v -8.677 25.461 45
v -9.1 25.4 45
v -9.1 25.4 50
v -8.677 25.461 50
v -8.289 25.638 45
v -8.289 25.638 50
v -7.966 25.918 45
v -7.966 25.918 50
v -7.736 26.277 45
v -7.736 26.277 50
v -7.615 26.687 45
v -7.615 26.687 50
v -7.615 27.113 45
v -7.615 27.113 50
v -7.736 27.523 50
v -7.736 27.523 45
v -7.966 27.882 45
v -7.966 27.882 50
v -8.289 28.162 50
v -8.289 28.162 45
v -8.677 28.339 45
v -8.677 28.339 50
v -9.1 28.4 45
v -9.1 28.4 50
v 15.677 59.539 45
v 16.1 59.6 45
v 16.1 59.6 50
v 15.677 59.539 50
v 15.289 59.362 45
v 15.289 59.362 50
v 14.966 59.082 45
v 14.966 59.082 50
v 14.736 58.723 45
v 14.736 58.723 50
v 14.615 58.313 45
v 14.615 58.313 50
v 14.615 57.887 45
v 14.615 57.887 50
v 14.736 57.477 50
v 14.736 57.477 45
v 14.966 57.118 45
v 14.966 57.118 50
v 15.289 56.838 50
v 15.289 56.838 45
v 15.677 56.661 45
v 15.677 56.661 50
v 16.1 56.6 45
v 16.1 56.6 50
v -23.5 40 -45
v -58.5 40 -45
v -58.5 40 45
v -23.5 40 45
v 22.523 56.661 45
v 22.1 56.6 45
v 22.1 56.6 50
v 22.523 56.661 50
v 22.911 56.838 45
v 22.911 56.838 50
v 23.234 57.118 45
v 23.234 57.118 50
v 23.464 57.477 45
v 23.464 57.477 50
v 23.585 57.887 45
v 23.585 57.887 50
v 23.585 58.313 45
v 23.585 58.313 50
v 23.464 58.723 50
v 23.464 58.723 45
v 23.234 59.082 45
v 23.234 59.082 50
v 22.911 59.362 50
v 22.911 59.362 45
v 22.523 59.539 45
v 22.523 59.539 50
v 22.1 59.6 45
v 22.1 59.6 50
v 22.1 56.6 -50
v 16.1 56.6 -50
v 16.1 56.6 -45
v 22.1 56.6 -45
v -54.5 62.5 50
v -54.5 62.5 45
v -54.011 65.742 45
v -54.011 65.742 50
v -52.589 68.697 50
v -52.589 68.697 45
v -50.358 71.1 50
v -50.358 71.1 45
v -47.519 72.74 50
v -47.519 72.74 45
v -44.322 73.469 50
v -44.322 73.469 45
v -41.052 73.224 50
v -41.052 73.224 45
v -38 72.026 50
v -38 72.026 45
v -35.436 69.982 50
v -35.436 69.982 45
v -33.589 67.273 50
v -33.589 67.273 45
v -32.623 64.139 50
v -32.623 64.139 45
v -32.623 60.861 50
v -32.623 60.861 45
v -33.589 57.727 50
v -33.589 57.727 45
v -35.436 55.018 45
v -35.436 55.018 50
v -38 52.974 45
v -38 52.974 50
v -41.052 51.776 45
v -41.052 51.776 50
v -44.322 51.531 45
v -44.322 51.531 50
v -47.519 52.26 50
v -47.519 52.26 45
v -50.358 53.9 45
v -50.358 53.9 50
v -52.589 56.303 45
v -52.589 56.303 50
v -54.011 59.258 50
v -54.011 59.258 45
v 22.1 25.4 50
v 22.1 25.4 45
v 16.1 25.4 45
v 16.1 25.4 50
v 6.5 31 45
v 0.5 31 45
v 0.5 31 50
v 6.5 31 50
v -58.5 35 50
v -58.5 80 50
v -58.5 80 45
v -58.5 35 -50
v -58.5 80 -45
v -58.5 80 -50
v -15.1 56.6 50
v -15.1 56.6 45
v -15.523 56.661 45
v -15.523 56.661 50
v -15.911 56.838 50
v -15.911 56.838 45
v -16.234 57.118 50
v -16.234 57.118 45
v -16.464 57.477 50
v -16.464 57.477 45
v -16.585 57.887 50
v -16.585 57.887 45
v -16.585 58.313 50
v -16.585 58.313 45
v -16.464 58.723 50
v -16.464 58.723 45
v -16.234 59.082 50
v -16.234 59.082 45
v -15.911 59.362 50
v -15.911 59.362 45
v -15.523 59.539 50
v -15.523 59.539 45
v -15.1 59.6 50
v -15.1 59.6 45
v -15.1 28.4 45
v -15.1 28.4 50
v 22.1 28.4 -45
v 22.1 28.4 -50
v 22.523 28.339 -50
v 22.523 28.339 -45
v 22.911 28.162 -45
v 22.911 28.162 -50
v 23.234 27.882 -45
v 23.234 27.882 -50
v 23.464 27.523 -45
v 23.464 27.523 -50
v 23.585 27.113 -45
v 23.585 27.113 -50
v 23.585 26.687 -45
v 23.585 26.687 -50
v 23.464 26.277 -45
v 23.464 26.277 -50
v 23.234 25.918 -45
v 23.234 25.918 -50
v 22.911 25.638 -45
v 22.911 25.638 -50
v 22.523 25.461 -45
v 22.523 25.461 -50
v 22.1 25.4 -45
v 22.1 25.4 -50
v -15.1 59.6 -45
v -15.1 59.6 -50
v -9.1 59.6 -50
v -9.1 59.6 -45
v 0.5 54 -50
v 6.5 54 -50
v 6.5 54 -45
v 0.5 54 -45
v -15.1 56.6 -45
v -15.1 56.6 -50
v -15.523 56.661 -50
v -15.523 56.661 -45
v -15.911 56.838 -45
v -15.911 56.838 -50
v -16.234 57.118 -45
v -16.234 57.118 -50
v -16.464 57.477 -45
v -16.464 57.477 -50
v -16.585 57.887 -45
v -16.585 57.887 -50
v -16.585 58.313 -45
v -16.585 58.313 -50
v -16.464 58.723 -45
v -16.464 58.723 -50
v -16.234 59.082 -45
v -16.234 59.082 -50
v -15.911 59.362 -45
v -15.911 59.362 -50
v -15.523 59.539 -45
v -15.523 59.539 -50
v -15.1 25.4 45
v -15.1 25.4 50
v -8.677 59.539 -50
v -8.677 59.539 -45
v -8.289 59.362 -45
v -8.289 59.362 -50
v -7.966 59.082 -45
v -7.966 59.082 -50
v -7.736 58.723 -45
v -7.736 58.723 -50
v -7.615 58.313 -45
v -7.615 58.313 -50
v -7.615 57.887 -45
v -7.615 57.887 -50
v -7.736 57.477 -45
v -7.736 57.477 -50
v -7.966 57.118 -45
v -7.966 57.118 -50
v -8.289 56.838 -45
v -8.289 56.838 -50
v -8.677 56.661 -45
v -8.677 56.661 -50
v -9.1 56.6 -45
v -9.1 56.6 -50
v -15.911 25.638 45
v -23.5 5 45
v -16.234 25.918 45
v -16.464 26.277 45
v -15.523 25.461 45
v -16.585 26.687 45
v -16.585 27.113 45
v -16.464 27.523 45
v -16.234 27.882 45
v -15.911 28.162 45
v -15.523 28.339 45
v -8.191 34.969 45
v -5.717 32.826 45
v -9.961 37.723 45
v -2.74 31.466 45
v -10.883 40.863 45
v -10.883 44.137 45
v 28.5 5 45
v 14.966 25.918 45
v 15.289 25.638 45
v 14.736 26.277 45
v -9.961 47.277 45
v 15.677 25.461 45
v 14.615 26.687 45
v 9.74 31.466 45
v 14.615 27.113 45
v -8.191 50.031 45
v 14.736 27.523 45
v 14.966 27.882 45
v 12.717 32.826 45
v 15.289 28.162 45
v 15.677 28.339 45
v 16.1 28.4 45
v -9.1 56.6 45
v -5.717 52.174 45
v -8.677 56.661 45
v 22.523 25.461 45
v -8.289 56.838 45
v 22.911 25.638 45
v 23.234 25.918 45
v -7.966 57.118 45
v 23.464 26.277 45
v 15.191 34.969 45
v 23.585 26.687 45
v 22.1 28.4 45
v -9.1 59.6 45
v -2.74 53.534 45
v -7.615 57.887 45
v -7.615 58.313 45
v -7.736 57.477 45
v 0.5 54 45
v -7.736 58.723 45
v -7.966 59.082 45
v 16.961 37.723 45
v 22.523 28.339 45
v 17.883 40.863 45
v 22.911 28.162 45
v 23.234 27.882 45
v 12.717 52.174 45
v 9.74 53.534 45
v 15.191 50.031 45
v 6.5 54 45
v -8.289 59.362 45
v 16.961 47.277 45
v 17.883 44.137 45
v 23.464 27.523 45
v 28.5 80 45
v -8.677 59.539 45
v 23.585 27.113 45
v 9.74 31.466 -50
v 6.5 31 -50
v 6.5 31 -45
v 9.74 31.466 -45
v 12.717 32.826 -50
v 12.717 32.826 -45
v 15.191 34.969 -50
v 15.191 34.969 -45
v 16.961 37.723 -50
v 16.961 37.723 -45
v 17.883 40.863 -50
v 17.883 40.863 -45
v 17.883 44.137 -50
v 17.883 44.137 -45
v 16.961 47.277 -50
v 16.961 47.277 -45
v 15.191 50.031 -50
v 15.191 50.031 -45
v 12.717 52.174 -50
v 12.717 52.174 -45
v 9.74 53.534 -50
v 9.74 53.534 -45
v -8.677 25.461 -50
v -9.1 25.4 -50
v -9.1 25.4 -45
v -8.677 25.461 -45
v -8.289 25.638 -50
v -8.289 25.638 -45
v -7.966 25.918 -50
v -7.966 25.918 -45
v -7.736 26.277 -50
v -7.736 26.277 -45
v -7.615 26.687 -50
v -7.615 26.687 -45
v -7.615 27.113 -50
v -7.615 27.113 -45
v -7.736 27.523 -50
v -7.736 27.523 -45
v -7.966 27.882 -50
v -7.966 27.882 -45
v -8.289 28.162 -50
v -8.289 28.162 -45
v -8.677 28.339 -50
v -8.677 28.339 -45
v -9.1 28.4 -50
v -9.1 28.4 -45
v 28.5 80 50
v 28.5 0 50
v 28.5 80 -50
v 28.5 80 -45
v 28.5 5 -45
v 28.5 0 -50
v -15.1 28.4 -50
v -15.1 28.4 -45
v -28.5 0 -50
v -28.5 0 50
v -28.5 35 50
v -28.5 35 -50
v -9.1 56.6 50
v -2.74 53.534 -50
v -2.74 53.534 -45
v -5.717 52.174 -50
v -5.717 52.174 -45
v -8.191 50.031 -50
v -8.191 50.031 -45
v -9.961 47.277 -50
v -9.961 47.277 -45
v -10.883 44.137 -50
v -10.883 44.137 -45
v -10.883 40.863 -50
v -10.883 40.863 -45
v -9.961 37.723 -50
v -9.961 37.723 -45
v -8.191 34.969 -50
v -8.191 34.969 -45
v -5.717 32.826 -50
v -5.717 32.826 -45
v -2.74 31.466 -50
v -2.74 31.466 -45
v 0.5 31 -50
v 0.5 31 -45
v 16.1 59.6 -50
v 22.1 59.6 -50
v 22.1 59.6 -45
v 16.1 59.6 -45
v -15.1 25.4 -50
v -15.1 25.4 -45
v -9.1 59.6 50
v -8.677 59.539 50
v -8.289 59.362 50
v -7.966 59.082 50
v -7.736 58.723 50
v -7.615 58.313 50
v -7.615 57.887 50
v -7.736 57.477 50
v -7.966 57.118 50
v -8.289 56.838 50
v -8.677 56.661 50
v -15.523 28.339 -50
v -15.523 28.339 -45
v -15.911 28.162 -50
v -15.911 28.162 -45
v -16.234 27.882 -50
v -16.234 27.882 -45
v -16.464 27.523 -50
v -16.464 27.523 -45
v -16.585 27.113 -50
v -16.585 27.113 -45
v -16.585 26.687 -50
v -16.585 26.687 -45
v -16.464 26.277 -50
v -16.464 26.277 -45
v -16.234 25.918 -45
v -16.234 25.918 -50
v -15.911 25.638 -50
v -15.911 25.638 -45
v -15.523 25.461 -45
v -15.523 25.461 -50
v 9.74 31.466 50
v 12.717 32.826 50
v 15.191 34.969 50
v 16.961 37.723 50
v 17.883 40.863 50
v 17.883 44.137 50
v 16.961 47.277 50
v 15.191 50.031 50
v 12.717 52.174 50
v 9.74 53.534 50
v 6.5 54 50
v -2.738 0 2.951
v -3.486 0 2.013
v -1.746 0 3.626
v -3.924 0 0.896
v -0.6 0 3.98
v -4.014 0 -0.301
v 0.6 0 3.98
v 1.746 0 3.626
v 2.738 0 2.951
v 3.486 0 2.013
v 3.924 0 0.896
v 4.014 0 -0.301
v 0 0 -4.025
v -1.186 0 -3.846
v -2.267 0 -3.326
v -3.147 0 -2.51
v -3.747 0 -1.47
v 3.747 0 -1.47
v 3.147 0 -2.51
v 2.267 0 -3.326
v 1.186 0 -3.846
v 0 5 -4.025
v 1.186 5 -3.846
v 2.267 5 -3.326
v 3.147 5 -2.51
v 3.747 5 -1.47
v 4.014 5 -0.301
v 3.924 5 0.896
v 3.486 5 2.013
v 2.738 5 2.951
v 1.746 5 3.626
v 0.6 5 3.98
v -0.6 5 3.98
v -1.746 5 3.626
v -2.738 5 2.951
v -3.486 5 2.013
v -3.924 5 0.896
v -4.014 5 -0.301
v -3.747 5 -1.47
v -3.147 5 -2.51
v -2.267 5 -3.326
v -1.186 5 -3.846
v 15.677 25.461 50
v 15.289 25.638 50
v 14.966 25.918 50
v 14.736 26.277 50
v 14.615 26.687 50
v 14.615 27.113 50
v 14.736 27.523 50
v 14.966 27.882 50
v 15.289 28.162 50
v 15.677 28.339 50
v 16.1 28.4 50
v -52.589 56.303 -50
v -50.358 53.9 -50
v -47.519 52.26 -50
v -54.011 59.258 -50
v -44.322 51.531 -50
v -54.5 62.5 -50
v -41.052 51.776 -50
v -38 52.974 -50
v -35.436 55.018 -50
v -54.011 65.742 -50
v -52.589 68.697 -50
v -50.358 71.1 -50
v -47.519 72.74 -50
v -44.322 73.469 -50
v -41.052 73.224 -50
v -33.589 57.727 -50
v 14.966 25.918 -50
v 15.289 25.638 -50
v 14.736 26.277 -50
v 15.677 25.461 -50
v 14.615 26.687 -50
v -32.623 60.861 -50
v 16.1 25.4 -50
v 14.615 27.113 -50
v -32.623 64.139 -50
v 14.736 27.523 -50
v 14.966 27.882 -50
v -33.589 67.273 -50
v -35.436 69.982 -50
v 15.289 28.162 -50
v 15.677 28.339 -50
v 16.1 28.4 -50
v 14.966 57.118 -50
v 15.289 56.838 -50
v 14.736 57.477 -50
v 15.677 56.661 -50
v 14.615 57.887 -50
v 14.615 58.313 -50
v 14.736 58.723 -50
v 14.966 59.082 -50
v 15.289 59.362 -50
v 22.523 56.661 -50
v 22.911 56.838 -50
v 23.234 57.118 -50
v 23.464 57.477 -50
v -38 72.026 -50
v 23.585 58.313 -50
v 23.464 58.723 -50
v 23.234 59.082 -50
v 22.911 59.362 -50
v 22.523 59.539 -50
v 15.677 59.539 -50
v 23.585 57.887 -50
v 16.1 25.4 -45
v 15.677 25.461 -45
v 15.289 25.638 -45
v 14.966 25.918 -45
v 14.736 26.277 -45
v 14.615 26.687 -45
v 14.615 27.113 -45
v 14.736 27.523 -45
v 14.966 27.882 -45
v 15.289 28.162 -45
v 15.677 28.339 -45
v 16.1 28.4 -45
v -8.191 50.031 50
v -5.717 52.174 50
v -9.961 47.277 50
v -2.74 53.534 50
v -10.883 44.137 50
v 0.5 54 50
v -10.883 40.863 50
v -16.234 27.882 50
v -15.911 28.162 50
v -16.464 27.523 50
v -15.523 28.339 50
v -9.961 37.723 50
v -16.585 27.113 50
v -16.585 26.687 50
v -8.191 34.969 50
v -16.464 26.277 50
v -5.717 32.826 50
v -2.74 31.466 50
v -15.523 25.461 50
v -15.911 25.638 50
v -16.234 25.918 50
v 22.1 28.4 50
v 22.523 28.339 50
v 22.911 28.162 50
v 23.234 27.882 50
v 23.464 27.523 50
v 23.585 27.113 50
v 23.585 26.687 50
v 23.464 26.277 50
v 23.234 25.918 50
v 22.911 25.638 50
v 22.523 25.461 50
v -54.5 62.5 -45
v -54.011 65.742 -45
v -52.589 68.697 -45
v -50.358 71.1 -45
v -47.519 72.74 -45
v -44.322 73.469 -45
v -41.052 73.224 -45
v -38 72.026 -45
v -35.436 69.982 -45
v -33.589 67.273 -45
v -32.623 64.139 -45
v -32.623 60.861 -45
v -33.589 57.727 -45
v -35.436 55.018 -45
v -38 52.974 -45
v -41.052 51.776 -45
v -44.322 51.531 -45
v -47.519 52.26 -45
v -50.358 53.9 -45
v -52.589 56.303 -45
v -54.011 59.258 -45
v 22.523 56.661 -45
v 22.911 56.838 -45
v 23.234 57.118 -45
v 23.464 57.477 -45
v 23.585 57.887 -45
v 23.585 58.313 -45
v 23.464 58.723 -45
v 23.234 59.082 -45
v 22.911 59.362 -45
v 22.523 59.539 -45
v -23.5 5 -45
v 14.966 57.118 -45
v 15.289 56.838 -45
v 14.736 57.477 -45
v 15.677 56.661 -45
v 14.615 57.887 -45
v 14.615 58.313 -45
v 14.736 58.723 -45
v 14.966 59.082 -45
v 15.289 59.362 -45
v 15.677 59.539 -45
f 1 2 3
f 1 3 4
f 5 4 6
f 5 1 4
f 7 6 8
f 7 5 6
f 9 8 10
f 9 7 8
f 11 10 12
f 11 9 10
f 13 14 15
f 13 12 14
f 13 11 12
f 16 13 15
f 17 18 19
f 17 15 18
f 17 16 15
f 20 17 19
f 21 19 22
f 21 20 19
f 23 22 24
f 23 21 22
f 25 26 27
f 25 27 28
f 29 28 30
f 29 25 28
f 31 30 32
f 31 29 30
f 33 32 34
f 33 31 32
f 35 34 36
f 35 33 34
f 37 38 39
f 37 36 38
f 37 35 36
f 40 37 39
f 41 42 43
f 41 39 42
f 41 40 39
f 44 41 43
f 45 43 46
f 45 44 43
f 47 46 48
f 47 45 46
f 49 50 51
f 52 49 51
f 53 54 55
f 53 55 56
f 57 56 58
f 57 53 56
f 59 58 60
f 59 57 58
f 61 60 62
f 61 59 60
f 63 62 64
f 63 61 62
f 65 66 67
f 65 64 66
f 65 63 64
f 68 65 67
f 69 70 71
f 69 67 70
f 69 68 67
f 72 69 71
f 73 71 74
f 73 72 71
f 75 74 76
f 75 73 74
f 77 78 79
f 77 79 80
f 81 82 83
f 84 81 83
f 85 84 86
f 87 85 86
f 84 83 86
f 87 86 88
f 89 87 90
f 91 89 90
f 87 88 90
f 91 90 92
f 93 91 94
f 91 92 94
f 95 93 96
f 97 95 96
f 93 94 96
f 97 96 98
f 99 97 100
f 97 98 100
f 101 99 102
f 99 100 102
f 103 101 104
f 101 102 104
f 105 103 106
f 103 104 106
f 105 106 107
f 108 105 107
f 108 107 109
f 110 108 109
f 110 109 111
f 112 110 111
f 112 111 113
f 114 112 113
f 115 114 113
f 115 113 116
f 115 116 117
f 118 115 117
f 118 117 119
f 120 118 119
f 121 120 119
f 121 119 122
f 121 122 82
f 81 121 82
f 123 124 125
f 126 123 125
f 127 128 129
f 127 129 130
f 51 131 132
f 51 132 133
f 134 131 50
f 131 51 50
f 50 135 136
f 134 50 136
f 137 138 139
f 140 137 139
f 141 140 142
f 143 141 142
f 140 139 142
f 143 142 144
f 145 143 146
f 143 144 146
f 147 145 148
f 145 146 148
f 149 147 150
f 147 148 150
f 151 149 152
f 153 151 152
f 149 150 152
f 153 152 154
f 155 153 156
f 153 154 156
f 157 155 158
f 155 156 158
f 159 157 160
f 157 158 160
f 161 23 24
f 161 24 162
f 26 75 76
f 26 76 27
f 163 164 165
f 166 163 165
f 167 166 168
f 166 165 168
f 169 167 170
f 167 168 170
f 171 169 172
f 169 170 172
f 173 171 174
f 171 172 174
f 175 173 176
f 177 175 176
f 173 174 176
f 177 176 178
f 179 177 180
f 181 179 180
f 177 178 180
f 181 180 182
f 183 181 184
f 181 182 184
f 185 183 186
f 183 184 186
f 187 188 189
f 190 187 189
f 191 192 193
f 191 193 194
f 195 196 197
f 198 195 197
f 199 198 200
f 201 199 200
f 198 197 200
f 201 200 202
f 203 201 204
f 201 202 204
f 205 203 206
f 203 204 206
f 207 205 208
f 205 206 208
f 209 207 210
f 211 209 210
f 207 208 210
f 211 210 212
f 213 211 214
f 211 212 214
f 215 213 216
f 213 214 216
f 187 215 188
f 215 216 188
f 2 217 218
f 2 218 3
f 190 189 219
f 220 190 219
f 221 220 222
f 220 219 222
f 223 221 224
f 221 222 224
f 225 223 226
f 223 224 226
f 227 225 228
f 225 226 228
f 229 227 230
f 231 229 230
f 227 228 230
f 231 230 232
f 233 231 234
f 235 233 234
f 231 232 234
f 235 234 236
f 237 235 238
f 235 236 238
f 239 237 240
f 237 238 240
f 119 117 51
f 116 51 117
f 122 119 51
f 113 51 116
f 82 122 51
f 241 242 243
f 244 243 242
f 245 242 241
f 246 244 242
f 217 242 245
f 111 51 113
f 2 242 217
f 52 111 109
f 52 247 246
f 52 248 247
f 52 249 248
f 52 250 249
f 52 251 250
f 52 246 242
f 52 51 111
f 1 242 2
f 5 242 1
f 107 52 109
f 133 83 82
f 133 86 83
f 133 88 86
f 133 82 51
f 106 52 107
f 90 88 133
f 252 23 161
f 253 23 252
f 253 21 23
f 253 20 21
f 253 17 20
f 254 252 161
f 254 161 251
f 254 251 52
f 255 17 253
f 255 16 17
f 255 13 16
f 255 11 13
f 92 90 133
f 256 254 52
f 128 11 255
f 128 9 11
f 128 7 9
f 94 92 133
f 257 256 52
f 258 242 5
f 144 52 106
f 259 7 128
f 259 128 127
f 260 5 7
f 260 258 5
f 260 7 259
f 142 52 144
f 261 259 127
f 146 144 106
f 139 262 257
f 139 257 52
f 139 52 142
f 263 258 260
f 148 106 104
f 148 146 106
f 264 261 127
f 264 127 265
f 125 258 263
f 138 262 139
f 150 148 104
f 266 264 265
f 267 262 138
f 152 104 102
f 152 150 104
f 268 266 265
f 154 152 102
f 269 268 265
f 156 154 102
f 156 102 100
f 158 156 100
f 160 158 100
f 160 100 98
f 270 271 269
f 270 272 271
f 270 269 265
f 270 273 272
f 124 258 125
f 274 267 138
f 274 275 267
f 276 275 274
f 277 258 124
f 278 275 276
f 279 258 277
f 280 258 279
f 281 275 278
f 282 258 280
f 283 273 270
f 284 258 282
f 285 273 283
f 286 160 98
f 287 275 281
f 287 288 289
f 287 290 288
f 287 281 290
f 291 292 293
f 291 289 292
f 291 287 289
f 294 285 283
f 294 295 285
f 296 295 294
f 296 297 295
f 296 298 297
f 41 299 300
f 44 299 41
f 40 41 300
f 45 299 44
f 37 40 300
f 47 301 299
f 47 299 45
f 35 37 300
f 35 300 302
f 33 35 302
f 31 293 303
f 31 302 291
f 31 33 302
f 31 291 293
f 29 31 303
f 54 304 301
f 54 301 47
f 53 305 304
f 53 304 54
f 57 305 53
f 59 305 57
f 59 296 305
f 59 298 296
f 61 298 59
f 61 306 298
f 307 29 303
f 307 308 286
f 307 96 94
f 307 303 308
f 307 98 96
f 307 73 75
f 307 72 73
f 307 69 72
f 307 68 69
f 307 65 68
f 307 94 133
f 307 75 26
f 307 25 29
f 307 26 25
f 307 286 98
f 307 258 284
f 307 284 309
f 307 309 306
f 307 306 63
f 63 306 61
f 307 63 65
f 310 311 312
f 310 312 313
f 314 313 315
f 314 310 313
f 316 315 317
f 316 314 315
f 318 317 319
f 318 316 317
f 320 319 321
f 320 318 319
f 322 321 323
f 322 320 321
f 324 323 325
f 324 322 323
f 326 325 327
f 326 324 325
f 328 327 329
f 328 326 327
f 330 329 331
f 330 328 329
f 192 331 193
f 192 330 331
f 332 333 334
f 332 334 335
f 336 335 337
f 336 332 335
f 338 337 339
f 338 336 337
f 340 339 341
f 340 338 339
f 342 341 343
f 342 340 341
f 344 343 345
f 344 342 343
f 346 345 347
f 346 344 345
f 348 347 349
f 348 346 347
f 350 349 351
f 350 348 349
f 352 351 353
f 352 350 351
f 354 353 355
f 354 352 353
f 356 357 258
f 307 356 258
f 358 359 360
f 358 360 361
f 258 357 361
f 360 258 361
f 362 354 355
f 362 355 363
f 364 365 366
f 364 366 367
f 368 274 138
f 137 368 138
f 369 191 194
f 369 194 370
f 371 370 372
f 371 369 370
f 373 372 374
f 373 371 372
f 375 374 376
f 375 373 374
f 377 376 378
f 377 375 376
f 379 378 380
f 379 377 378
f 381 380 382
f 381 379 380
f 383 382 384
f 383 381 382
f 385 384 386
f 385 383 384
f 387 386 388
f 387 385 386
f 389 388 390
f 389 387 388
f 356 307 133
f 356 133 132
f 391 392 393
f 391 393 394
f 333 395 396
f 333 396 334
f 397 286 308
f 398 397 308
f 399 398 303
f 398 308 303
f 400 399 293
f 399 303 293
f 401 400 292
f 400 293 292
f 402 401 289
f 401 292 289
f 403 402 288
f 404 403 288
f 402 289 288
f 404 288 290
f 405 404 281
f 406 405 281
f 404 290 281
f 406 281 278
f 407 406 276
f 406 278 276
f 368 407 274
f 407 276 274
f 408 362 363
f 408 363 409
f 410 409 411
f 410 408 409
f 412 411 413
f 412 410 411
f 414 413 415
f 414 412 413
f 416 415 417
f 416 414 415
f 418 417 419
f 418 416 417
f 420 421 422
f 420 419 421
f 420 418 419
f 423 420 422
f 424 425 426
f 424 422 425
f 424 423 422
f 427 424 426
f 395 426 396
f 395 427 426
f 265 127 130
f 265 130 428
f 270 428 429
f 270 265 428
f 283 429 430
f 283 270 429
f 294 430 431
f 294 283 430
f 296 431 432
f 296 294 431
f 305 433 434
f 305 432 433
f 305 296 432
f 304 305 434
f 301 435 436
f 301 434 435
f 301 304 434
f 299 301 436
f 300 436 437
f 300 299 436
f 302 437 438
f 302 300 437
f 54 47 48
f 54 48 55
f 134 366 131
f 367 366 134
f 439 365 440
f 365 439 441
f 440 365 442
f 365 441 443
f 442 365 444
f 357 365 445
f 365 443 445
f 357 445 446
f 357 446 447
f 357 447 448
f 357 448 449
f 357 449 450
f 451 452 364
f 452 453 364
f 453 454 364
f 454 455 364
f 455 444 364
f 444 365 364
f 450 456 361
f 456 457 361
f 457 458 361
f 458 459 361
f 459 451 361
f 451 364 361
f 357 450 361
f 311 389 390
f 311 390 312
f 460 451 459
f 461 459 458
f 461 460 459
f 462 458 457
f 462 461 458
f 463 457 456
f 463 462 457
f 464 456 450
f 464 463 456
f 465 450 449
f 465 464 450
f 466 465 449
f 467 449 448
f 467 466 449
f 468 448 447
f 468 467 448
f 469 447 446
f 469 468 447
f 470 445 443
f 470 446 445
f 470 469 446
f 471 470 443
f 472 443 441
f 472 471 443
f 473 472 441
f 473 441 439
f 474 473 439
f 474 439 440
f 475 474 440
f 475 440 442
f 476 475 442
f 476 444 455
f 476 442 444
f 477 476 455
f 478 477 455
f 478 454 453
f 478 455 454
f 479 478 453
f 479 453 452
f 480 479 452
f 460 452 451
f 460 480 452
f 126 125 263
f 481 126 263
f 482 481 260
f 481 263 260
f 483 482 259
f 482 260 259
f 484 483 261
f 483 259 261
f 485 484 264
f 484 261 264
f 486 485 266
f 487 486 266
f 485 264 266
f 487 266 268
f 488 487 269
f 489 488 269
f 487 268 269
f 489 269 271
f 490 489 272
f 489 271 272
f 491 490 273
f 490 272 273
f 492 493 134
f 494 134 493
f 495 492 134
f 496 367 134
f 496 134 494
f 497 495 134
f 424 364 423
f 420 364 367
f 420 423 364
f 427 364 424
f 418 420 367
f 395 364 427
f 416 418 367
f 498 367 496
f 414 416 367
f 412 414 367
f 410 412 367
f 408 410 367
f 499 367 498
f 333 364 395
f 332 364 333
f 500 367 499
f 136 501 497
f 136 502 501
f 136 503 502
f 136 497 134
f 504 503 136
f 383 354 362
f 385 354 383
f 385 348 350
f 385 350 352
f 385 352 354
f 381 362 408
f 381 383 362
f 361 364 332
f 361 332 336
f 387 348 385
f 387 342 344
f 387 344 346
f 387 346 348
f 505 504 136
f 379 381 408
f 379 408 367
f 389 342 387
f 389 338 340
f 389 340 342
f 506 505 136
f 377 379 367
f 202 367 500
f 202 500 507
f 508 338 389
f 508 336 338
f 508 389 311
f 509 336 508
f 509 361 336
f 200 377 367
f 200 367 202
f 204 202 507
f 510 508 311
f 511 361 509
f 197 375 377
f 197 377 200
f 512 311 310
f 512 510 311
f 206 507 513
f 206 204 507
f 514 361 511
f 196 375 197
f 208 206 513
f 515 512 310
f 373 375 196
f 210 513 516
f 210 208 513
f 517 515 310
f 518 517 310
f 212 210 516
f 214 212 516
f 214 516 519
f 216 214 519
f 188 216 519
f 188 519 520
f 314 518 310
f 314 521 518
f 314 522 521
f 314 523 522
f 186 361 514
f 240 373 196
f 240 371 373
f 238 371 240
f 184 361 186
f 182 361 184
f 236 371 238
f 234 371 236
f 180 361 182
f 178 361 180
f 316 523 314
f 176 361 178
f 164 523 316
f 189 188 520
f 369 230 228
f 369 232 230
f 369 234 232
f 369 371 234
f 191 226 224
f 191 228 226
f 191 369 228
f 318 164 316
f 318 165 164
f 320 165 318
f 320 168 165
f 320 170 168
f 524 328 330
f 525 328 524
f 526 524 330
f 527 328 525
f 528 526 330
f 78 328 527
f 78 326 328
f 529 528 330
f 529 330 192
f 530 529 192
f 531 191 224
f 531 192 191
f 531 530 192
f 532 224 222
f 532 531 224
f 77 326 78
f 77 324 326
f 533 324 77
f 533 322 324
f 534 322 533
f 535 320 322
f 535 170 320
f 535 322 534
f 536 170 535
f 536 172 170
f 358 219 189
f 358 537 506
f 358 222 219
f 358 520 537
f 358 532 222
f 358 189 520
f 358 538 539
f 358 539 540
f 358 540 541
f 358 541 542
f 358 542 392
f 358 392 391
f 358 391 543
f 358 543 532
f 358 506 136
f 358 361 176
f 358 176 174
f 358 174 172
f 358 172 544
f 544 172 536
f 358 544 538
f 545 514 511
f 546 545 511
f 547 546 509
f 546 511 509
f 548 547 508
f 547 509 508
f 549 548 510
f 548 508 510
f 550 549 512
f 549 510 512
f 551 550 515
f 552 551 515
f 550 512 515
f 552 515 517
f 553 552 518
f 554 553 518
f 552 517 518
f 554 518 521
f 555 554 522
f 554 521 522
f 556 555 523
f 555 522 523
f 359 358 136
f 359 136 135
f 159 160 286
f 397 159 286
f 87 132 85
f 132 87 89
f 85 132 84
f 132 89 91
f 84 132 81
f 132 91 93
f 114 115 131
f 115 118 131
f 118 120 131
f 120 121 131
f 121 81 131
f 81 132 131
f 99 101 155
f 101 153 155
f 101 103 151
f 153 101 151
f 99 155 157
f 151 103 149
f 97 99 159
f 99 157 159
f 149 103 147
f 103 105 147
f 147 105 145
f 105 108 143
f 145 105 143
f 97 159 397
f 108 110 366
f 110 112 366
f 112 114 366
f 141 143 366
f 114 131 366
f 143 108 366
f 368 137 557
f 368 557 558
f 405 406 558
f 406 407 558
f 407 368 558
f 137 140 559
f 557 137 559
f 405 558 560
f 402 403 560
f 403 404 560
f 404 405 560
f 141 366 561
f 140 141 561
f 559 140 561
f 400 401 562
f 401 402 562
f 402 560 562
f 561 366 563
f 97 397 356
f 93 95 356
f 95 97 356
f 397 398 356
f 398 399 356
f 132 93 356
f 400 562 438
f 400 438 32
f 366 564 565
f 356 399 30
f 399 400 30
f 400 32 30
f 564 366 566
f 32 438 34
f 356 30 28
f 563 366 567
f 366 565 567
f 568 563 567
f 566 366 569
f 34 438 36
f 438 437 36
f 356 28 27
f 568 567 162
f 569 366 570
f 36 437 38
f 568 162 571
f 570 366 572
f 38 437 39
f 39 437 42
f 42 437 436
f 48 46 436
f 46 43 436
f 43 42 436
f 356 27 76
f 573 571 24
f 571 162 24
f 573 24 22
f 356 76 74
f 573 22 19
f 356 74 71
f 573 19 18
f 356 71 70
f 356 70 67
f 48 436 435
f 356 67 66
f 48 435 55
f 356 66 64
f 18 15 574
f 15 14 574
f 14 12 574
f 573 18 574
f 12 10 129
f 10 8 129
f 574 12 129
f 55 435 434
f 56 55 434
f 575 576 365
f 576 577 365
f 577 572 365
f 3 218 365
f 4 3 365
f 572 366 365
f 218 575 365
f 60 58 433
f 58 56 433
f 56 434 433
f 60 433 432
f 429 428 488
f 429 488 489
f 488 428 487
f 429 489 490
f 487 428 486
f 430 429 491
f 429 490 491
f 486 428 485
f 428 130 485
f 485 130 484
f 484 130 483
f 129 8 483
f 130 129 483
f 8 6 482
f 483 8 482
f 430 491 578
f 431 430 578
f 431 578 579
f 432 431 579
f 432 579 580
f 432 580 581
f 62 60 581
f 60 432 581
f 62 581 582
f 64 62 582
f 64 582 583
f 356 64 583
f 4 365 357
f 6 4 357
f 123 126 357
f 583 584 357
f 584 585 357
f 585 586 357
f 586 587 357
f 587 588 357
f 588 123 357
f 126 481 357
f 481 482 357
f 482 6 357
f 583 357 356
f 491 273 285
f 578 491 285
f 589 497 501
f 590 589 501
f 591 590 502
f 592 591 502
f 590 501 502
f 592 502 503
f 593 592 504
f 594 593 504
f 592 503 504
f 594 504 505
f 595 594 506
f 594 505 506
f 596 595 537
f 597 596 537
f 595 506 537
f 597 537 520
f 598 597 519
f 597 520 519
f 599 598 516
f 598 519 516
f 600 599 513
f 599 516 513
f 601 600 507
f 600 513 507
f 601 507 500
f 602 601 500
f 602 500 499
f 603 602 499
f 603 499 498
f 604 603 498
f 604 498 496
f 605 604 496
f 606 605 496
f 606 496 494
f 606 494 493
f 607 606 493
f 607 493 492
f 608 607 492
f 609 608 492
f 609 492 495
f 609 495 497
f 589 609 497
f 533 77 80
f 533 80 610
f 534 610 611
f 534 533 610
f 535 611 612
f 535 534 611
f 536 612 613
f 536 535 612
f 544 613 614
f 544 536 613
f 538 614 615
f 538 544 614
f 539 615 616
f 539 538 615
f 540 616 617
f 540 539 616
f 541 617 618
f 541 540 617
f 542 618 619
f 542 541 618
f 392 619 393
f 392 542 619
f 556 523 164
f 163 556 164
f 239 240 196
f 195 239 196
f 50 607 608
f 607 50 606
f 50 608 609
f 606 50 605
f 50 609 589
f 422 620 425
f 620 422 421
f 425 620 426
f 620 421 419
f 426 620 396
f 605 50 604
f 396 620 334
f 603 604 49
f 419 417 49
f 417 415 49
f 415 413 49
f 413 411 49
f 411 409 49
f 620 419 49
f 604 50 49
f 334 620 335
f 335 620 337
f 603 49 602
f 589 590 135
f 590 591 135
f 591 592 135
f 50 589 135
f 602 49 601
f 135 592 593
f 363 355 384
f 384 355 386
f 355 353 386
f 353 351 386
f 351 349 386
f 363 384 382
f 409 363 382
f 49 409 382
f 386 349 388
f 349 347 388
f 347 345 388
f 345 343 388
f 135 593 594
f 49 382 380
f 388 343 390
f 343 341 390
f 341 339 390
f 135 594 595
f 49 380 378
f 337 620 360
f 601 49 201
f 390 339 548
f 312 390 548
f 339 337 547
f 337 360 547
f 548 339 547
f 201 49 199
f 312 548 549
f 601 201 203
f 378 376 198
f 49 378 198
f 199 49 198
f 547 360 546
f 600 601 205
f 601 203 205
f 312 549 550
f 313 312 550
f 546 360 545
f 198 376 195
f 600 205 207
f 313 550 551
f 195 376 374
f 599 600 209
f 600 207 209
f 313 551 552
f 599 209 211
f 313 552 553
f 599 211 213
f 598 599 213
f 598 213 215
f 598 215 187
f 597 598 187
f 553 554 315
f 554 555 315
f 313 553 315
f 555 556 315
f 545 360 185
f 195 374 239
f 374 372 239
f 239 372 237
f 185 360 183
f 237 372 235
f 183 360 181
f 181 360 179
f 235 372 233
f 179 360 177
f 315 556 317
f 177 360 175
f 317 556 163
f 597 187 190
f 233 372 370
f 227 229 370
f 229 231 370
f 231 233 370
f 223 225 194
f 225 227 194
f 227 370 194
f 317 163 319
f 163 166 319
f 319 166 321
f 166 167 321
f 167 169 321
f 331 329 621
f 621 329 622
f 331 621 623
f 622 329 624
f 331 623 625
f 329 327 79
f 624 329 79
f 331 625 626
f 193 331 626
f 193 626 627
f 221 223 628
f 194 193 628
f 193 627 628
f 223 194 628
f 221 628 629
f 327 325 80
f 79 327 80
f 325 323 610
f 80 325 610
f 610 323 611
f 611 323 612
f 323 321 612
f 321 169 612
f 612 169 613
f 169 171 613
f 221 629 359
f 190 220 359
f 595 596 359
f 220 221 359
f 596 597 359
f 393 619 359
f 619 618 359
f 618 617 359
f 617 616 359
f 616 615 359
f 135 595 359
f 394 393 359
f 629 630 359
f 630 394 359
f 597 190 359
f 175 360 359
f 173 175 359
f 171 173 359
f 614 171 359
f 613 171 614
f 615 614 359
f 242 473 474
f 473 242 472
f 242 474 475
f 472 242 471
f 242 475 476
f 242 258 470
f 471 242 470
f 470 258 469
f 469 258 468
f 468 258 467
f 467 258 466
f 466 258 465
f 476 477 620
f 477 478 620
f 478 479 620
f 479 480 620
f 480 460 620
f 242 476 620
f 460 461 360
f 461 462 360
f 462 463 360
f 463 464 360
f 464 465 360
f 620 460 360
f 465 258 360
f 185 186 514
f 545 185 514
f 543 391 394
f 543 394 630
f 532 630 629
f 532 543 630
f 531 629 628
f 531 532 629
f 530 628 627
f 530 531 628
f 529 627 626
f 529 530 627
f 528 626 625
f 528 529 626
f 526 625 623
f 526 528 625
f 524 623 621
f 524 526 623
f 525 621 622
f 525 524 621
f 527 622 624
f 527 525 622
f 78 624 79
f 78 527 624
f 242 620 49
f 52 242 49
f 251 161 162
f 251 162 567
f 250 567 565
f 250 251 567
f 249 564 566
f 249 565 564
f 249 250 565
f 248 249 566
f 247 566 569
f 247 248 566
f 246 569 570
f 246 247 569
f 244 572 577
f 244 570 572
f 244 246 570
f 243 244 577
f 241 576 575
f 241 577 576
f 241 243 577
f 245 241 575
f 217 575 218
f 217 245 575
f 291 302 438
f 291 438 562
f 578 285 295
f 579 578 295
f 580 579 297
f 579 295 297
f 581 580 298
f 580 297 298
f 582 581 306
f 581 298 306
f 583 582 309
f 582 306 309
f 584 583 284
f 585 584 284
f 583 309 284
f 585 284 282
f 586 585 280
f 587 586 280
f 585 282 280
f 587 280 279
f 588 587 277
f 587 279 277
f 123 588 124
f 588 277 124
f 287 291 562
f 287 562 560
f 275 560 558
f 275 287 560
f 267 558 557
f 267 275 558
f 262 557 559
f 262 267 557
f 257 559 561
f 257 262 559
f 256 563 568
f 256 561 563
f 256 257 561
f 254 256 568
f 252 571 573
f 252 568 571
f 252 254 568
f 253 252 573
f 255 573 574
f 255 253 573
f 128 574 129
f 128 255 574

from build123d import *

# Parameters (mm, degrees)
SKETCH1_W           = 57
SKETCH1_H           = 100
BOSS_EXTRUDE1_DEPTH = 80
SKETCH3_W           = 75
SKETCH3_H           = 90
CUT_EXTRUDE1_DEPTH  = 52
SKETCH4_R           = 4.025
CUT_EXTRUDE2_DEPTH  = 114.213294272
BOSS_EXTRUDE2_DEPTH = 30
CUT_EXTRUDE5_REACH  = 112.223
SKETCH8_W           = 90
SKETCH8_H           = 40
SKETCH5_R           = 11
CUT_EXTRUDE3_DEPTH  = 141.791512528


with BuildPart() as part:
    # Sketch1 → Boss-Extrude1 (new body)
    with BuildSketch(Plane(origin=(0, 0, 0), x_dir=(1, 0, 0), z_dir=(0, 1, 0))):
        Rectangle(SKETCH1_W, SKETCH1_H)
    extrude(amount=BOSS_EXTRUDE1_DEPTH)

    # Sketch3 → Cut-Extrude1 (cut)
    with BuildSketch(Plane(origin=(28.5, 40, 0), x_dir=(0, 1, 0), z_dir=(-1, 0, 0))):
        with Locations((2.5, 0)):
            Rectangle(SKETCH3_W, SKETCH3_H)
    extrude(amount=CUT_EXTRUDE1_DEPTH, mode=Mode.SUBTRACT)

    # Sketch4 → Cut-Extrude2 (cut, through all)
    with BuildSketch(Plane(origin=(-40, 5, 0), x_dir=(-1, 0, 0), z_dir=(0, -1, 0))):
        with Locations(Location((-40, 0, 0), (0, 0, 90))):
            Circle(SKETCH4_R)
    extrude(amount=CUT_EXTRUDE2_DEPTH, mode=Mode.SUBTRACT)

    # Sketch7 → Boss-Extrude2 (add)
    with BuildSketch(Plane.ZY.offset(28.5)):
        Polygon((-50, 80), (-45, 80), (-45, 40), (45, 40), (45, 80), (50, 80), (50, 35), (-50, 35), align=None)
    extrude(amount=BOSS_EXTRUDE2_DEPTH)

    # Sketch8 → Cut-Extrude5 (cut, up to next)
    with BuildSketch(Plane.ZY.offset(28.5), mode=Mode.PRIVATE) as cut_extrude5_sk1:
        with Locations((0, 60)):
            Rectangle(SKETCH8_W, SKETCH8_H)
    cut_extrude5_tool1 = extrude(cut_extrude5_sk1.sketch, amount=-CUT_EXTRUDE5_REACH, mode=Mode.PRIVATE) & part.part
    add(cut_extrude5_tool1.solids().sort_by_distance((-28.5, 60, 0))[0], mode=Mode.SUBTRACT)

    # Sketch5 → Cut-Extrude3 (cut, through all)
    with BuildSketch(Plane(origin=(0, 0, -50), x_dir=(-1, 0, 0), z_dir=(0, 0, -1))):
        with Locations((43.5, 62.5)):
            Circle(SKETCH5_R)
        with BuildLine():
            Line((-22.1, 59.6), (-16.1, 59.6))
            ThreePointArc((-16.1, 59.6), (-14.6, 58.1), (-16.1, 56.6))
            Line((-16.1, 56.6), (-22.1, 56.6))
            ThreePointArc((-22.1, 56.6), (-23.6, 58.1), (-22.1, 59.6))
        make_face()
        with BuildLine():
            Line((-0.5, 31), (-6.5, 31))
            ThreePointArc((-6.5, 31), (-18, 42.5), (-6.5, 54))
            Line((-6.5, 54), (-0.5, 54))
            ThreePointArc((-0.5, 54), (11, 42.5), (-0.5, 31))
        make_face()
        with BuildLine():
            Line((-22.1, 25.4), (-16.1, 25.4))
            ThreePointArc((-16.1, 25.4), (-14.6, 26.9), (-16.1, 28.4))
            Line((-16.1, 28.4), (-22.1, 28.4))
            ThreePointArc((-22.1, 28.4), (-23.6, 26.9), (-22.1, 25.4))
        make_face()
        with BuildLine():
            Line((15.1, 25.4), (9.1, 25.4))
            ThreePointArc((9.1, 25.4), (7.6, 26.9), (9.1, 28.4))
            Line((9.1, 28.4), (15.1, 28.4))
            ThreePointArc((15.1, 28.4), (16.6, 26.9), (15.1, 25.4))
        make_face()
        with BuildLine():
            Line((15.1, 59.6), (9.1, 59.6))
            ThreePointArc((9.1, 59.6), (7.6, 58.1), (9.1, 56.6))
            Line((9.1, 56.6), (15.1, 56.6))
            ThreePointArc((15.1, 56.6), (16.6, 58.1), (15.1, 59.6))
        make_face()
    extrude(amount=-CUT_EXTRUDE3_DEPTH, mode=Mode.SUBTRACT)


solid = part.part
